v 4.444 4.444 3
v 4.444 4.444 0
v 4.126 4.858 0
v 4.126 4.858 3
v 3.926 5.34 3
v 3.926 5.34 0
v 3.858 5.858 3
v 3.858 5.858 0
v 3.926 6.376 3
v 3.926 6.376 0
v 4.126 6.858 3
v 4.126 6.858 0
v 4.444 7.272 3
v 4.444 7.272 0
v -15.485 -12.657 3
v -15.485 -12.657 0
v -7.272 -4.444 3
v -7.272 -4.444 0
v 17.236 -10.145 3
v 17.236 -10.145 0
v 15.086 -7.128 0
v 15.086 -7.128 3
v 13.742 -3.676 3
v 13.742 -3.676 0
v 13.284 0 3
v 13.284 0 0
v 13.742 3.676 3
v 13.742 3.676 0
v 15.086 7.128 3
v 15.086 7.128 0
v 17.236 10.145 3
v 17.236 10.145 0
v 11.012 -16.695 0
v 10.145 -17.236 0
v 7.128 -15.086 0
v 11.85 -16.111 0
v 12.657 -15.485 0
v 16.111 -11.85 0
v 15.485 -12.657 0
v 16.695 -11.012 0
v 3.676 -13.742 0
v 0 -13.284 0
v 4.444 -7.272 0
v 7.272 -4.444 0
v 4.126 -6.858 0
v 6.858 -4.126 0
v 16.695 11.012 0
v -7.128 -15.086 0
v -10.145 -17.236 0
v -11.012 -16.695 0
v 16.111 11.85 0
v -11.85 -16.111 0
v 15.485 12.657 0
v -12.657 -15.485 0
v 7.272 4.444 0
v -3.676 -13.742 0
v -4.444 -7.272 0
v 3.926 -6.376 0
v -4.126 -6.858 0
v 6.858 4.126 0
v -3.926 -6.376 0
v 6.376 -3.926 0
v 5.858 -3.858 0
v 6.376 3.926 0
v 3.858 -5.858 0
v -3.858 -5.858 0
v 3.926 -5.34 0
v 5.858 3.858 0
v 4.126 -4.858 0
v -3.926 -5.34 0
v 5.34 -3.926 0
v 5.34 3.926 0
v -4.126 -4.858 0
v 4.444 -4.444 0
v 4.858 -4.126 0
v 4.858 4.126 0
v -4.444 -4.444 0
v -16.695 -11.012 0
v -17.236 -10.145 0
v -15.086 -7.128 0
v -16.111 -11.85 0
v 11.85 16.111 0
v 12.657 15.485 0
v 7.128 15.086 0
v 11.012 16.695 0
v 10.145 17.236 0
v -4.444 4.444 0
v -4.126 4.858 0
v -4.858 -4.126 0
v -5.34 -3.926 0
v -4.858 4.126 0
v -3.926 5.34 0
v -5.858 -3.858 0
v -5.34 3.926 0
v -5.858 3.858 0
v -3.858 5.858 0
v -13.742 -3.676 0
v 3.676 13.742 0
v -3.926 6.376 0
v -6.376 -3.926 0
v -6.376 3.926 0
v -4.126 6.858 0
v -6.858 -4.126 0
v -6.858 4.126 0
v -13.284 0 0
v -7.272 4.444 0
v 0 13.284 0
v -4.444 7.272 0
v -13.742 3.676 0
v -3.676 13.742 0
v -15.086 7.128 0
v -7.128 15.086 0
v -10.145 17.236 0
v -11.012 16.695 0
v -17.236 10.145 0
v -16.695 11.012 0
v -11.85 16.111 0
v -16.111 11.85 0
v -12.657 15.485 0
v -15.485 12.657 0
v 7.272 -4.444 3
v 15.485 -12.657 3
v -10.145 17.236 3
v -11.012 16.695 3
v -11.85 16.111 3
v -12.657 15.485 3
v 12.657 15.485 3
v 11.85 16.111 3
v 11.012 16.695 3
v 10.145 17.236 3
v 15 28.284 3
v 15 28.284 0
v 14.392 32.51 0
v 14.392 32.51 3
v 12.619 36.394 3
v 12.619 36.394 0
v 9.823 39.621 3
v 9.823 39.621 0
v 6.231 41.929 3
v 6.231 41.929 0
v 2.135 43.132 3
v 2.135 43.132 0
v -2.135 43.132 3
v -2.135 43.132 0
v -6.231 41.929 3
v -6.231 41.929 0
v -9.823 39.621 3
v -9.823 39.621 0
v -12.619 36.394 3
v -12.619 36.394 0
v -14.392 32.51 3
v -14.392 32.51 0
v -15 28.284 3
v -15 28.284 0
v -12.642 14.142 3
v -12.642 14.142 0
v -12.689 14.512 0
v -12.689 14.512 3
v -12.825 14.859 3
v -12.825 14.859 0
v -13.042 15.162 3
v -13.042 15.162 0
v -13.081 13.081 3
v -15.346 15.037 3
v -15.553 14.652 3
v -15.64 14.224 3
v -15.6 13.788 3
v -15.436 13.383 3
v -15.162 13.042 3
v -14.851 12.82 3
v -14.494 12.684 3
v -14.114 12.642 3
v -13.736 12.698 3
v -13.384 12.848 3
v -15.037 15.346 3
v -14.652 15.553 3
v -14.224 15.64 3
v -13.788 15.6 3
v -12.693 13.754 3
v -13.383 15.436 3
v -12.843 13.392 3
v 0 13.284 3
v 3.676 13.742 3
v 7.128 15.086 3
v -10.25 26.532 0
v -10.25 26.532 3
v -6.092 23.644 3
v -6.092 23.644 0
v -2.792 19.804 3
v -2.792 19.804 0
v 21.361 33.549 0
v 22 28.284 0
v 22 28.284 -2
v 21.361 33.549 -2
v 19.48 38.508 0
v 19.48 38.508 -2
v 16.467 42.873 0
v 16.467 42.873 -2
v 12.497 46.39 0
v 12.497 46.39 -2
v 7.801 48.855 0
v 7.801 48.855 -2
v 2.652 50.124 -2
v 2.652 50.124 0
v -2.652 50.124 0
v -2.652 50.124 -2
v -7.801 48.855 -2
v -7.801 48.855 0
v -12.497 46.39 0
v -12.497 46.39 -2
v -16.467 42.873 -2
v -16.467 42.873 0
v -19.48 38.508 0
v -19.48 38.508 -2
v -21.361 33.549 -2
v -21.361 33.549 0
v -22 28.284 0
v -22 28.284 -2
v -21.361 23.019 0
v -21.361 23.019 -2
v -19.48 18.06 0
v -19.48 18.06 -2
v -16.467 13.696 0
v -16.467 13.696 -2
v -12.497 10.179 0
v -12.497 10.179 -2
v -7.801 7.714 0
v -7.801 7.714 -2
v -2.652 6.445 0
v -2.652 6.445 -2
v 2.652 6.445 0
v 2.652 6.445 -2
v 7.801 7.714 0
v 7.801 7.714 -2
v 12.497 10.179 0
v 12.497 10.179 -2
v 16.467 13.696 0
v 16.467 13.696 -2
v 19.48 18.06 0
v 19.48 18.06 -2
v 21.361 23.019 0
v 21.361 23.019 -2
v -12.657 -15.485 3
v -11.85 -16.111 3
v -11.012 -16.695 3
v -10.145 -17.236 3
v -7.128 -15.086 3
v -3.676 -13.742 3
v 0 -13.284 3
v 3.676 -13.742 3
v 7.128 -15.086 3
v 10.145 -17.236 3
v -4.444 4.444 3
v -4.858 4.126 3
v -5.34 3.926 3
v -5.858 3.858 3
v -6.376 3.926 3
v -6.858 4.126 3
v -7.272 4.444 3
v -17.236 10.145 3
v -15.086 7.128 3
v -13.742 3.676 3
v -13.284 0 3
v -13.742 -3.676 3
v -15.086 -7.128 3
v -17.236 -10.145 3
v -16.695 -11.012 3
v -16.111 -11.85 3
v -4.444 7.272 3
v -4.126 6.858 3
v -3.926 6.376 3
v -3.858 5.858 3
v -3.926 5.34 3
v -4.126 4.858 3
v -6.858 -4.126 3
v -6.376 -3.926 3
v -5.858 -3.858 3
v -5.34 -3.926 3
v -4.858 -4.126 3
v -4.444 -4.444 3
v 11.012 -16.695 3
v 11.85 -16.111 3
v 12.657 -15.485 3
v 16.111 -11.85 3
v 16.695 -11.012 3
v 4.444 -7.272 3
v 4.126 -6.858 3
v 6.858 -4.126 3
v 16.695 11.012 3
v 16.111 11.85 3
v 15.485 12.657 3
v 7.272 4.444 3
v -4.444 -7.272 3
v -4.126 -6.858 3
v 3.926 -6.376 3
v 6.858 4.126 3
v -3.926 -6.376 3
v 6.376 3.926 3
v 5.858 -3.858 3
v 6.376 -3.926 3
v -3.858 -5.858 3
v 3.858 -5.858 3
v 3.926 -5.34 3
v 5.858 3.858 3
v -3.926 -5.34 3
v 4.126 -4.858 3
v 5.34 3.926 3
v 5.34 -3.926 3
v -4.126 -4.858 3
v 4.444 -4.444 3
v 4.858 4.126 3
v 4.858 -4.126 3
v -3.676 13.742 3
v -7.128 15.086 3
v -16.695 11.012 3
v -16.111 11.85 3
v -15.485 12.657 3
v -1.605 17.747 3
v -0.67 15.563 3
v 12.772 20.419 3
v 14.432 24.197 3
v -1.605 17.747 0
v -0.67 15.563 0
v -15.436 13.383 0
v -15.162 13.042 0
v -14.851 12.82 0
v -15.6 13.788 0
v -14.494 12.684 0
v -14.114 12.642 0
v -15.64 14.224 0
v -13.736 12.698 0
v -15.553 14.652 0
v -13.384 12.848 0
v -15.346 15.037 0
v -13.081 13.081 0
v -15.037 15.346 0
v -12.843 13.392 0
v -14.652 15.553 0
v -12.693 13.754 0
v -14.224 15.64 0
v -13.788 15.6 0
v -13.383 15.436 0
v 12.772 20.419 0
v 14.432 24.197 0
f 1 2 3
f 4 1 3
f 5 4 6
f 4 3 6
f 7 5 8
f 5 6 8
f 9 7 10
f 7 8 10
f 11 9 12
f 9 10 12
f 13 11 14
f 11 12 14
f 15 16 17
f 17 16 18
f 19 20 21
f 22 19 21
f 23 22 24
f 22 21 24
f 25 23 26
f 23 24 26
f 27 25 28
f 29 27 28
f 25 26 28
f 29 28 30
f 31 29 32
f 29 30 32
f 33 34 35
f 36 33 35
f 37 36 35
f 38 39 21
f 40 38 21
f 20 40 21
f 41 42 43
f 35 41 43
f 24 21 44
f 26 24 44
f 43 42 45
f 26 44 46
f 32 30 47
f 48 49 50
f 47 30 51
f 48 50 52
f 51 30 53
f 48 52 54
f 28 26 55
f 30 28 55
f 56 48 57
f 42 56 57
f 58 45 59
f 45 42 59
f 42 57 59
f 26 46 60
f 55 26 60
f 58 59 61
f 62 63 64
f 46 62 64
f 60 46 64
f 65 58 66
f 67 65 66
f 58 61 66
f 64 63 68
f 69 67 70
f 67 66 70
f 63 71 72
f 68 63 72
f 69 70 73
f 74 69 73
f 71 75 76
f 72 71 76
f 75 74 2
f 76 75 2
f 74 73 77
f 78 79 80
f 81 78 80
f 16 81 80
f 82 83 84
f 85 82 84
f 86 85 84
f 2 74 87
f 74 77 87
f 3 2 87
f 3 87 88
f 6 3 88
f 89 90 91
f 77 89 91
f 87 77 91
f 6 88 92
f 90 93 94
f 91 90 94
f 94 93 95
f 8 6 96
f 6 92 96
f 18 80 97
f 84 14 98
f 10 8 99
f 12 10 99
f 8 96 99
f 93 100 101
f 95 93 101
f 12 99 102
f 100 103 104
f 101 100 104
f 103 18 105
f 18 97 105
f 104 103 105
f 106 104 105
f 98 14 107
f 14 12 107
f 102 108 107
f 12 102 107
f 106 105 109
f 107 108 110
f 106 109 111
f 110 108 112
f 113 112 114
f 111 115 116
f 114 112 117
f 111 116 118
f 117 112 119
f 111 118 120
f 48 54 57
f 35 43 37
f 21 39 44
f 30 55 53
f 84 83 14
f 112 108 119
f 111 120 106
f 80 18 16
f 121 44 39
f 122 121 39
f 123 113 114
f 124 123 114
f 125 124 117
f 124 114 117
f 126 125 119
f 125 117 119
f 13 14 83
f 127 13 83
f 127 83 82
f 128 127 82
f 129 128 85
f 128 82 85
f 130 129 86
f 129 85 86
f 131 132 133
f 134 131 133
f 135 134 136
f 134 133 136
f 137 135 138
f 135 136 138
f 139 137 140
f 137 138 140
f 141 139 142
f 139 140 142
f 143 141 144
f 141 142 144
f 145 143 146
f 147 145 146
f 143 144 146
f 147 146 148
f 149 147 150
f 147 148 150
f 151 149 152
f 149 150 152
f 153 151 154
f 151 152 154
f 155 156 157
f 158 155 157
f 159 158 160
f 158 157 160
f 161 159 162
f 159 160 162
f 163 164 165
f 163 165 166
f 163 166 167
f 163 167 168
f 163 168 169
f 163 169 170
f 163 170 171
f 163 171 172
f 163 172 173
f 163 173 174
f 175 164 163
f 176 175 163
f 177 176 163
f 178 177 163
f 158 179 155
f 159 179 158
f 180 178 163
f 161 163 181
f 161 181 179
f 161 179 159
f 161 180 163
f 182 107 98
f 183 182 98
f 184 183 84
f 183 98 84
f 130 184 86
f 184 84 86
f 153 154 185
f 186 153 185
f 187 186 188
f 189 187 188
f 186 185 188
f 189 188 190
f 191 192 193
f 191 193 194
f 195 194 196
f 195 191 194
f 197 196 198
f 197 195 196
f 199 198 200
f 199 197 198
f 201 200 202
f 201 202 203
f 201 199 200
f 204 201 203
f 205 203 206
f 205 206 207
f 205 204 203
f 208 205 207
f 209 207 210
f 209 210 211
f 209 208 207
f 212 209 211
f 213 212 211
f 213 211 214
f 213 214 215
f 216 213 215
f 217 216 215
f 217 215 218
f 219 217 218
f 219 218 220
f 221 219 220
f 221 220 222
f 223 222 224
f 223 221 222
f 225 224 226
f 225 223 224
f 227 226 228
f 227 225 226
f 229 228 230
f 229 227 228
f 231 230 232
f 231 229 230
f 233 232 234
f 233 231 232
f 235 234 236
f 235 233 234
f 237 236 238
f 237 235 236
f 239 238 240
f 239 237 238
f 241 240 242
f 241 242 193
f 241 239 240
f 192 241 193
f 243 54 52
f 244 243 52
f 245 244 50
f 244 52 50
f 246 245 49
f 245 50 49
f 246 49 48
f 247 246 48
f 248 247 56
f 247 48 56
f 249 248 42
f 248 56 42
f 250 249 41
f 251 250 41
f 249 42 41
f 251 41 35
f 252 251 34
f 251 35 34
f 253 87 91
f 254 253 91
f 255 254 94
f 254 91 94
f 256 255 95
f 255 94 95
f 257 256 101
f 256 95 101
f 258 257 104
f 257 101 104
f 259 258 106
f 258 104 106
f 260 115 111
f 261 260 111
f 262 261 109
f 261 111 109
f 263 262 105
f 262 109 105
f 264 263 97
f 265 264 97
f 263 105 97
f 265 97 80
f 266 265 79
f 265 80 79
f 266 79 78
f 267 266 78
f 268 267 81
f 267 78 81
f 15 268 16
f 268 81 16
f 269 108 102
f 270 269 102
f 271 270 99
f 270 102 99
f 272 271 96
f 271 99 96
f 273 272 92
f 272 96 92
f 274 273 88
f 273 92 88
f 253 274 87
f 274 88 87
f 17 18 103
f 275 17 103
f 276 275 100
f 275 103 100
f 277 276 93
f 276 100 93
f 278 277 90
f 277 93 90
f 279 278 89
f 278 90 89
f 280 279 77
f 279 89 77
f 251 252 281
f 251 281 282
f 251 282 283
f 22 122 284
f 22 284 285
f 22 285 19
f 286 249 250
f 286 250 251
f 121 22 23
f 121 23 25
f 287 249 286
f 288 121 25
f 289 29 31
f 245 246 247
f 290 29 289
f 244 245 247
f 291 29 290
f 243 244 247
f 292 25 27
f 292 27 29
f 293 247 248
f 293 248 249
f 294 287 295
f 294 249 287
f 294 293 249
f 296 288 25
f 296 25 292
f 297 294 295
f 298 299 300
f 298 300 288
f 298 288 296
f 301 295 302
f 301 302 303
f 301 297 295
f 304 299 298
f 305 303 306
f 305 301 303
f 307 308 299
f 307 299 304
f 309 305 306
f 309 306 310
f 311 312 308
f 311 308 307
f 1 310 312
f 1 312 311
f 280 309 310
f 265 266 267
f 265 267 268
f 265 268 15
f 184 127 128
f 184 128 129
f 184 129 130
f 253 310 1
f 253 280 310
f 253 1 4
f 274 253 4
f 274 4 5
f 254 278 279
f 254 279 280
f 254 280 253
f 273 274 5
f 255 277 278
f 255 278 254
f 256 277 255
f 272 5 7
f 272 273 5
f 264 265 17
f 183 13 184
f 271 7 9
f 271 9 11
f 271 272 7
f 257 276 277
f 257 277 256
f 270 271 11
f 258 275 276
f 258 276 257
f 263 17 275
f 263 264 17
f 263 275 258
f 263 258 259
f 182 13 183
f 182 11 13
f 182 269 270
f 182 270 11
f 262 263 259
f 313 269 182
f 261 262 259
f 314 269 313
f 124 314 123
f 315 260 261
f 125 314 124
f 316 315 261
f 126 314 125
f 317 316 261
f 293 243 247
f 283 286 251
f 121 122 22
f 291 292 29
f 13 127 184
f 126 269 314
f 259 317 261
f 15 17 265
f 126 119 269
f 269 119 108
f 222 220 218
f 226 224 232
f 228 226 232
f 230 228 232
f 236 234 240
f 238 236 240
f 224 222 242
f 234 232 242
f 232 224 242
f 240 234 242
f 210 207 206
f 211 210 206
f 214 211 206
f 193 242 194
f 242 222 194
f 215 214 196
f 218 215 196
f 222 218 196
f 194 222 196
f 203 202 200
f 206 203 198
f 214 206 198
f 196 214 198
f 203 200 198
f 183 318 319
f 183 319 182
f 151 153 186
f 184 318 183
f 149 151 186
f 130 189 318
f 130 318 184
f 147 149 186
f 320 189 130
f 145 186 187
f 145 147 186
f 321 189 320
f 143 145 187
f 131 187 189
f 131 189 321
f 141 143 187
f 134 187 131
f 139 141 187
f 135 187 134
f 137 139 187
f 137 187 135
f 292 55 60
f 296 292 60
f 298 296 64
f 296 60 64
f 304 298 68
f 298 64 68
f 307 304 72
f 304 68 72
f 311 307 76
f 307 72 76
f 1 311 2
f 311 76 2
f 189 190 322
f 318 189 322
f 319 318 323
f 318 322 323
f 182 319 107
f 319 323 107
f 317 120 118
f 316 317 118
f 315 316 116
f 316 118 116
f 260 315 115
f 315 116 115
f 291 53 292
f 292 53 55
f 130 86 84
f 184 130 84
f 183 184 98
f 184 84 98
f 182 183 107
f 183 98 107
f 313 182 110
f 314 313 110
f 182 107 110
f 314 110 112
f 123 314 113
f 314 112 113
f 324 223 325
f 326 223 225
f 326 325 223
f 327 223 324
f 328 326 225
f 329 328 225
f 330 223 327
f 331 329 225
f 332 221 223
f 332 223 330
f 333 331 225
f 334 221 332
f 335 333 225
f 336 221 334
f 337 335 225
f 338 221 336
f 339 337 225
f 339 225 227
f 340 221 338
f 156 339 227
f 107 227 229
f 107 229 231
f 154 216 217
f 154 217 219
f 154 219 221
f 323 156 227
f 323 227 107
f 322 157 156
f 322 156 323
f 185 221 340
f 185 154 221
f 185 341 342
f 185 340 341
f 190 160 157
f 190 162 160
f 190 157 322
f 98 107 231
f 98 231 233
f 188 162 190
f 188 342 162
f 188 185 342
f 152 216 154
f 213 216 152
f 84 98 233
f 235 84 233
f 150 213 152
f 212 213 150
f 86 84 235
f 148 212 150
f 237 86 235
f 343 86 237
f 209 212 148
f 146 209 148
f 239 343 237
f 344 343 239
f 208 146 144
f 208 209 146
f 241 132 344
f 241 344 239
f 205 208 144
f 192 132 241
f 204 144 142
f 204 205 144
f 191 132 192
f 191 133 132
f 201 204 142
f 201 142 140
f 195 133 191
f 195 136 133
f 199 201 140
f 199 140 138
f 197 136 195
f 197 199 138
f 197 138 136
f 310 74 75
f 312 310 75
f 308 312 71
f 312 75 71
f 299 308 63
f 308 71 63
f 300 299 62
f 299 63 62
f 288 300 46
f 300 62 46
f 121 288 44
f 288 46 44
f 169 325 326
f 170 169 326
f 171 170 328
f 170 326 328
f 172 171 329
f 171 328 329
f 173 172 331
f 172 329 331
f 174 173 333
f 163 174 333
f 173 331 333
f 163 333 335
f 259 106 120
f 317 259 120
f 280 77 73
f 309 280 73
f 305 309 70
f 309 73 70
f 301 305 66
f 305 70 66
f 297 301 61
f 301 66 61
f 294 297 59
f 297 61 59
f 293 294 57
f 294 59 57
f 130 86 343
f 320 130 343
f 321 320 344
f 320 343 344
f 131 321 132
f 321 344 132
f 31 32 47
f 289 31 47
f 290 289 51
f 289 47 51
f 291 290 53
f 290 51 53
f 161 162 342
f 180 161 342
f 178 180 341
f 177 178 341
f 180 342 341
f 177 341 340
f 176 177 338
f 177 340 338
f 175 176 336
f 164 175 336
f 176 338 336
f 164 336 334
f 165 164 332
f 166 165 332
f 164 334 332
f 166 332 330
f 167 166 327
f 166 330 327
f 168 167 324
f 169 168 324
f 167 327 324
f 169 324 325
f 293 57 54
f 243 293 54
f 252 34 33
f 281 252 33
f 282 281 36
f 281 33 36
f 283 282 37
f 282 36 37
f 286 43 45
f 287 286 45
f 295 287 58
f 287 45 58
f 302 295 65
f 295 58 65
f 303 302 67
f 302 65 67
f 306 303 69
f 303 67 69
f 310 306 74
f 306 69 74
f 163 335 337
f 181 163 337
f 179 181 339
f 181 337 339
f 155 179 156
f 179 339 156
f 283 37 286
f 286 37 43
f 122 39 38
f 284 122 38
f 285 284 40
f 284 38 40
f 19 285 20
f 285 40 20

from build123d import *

# Parameters (mm, degrees)
F1_DEPTH    = 3
F2_T1_DEPTH = 3
F3_COUNT    = 4
F4_DEPTH    = 3
F5_R        = 22
F6_DEPTH    = 2
F7_DEPTH    = 3


# Not quite as in the source:
# - a fillet or chamfer that OpenCascade refuses, or shapes differently, is made with other operations: its cross-section is extruded or revolved along the edge and cut away or added


with BuildPart() as f1:
    # F0 (on Top) → F1 (new body)
    with BuildSketch(Plane.XY):
        with BuildLine():
            ThreePointArc((12.6570337171, 15.4854608418), (11.43476766, 16.4087198941), (10.1454269255, 17.2357277914))
            ThreePointArc((10.1454269255, 17.2357277914), (5.443888691, 14.3070012737), (0, 13.2842712475))
            ThreePointArc((0, 13.2842712475), (-5.443888691, 14.3070012737), (-10.1454269255, 17.2357277914))
            ThreePointArc((-10.1454269255, 17.2357277914), (-11.43476766, 16.4087198941), (-12.6570337171, 15.4854608418))
            Line((-12.6570337171, 15.4854608418), (-3.7836501514, 6.6120772761))
            ThreePointArc((-3.7836501514, 6.6120772761), (0, 6.2842712475), (3.7836501514, 6.6120772761))
            Line((3.7836501514, 6.6120772761), (12.6570337171, 15.4854608418))
        make_face()
        with BuildLine():
            Line((3.0294372515, 5.8578643763), (3.7836501514, 6.6120772761))
            ThreePointArc((3.7836501514, 6.6120772761), (0, 6.2842712475), (-3.7836501514, 6.6120772761))
            Line((-3.7836501514, 6.6120772761), (-3.0294372515, 5.8578643763))
            Line((-3.0294372515, 5.8578643763), (-4.4436508139, 4.4436508139))
            Line((-4.4436508139, 4.4436508139), (0, 0))
            Line((0, 0), (4.4436508139, 4.4436508139))
            Line((4.4436508139, 4.4436508139), (3.0294372515, 5.8578643763))
        make_face()
    extrude(amount=F1_DEPTH)

    # F2: fillet of radius 2 on 2 edges, made by hand

    # F2_s2 → F2_t1 (join)
    with BuildSketch(Plane.XY):
        with BuildLine():
            ThreePointArc((-4.4436508139, 7.2720779386), (-3.8578643763, 5.8578643763), (-4.4436508139, 4.4436508139))
            Line((-4.4436508139, 4.4436508139), (-3.0294372515, 5.8578643763))
            Line((-3.0294372515, 5.8578643763), (-4.4436508139, 7.2720779386))
        make_face()
        with BuildLine():
            ThreePointArc((4.4436508139, 4.4436508139), (3.8578643763, 5.8578643763), (4.4436508139, 7.2720779386))
            Line((4.4436508139, 7.2720779386), (3.0294372515, 5.8578643763))
            Line((3.0294372515, 5.8578643763), (4.4436508139, 4.4436508139))
        make_face()
    extrude(amount=F2_T1_DEPTH)

    # F3: F1 ×4 about axis
    f3_axis = Axis((0, 0, 1.5), (0, 0, -1))


with BuildPart() as f1_1:
    add(f1.part)
    for i in range(1, F3_COUNT):
        add(f1.part.rotate(f3_axis, i * 360 / F3_COUNT))


with BuildPart() as f4:
    # F0 (on Top) → F4 (new body)
    with BuildSketch(Plane.XY):
        with BuildLine():
            ThreePointArc((10.1454269255, 17.2357277914), (13.7328329904, 22.2502594759), (15, 28.2842712475))
            ThreePointArc((15, 28.2842712475), (0, 43.2842712475), (-15, 28.2842712475))
            ThreePointArc((-15, 28.2842712475), (-8.079180403, 25.220367714), (-2.7924795837, 19.8040919452))
            ThreePointArc((-2.7924795837, 19.8040919452), (3.8943012543, 19.6171969899), (10.1454269255, 17.2357277914))
        make_face()
    extrude(amount=F4_DEPTH)



with BuildPart() as f4b:
    # F0 (on Top) → F4, piece 2 (new body)
    with BuildSketch(Plane.XY):
        with BuildLine():
            ThreePointArc((-12.6421356237, 14.1421356237), (-12.7457951685, 14.6900711429), (-13.0424467346, 15.162275))
            ThreePointArc((-13.0424467346, 15.162275), (-13.6018583504, 14.6625185222), (-14.1421356237, 14.1421356237))
            Line((-14.1421356237, 14.1421356237), (-13.081475452, 13.081475452))
            ThreePointArc((-13.081475452, 13.081475452), (-12.756316325, 13.5681104752), (-12.6421356237, 14.1421356237))
        make_face()
    extrude(amount=F4_DEPTH)


with BuildPart() as f4_1:
    add(f4.part)

    add(f4b.part)  # F6 merges F4b
    # F5 (on Top) → F6 (join)
    with BuildSketch(Plane.XY):
        with Locations((0, 28.2842712475)):
            Circle(F5_R)
    extrude(amount=-F6_DEPTH)

    # F0 (on Top) → F7 (join)
    with BuildSketch(Plane.XY):
        with BuildLine():
            ThreePointArc((0, 13.2842712475), (5.443888691, 14.3070012737), (10.1454269255, 17.2357277914))
            ThreePointArc((10.1454269255, 17.2357277914), (3.8943012543, 19.6171969899), (-2.7924795837, 19.8040919452))
            ThreePointArc((-2.7924795837, 19.8040919452), (-1.1049131261, 16.6689586115), (0, 13.2842712475))
        make_face()
        with BuildLine():
            ThreePointArc((-14.1421356237, 14.1421356237), (-13.6018583504, 14.6625185222), (-13.0424467346, 15.162275))
            ThreePointArc((-13.0424467346, 15.162275), (-15.2027957955, 15.2027957955), (-15.162275, 13.0424467346))
            ThreePointArc((-15.162275, 13.0424467346), (-14.6625185222, 13.6018583504), (-14.1421356237, 14.1421356237))
        make_face()
        with BuildLine():
            Line((-13.081475452, 13.081475452), (-14.1421356237, 14.1421356237))
            ThreePointArc((-14.1421356237, 14.1421356237), (-14.6625185222, 13.6018583504), (-15.162275, 13.0424467346))
            ThreePointArc((-15.162275, 13.0424467346), (-14.1140056768, 12.6423994116), (-13.081475452, 13.081475452))
        make_face()
    extrude(amount=F7_DEPTH)


solid = Compound([f1_1.part, f4_1.part])
